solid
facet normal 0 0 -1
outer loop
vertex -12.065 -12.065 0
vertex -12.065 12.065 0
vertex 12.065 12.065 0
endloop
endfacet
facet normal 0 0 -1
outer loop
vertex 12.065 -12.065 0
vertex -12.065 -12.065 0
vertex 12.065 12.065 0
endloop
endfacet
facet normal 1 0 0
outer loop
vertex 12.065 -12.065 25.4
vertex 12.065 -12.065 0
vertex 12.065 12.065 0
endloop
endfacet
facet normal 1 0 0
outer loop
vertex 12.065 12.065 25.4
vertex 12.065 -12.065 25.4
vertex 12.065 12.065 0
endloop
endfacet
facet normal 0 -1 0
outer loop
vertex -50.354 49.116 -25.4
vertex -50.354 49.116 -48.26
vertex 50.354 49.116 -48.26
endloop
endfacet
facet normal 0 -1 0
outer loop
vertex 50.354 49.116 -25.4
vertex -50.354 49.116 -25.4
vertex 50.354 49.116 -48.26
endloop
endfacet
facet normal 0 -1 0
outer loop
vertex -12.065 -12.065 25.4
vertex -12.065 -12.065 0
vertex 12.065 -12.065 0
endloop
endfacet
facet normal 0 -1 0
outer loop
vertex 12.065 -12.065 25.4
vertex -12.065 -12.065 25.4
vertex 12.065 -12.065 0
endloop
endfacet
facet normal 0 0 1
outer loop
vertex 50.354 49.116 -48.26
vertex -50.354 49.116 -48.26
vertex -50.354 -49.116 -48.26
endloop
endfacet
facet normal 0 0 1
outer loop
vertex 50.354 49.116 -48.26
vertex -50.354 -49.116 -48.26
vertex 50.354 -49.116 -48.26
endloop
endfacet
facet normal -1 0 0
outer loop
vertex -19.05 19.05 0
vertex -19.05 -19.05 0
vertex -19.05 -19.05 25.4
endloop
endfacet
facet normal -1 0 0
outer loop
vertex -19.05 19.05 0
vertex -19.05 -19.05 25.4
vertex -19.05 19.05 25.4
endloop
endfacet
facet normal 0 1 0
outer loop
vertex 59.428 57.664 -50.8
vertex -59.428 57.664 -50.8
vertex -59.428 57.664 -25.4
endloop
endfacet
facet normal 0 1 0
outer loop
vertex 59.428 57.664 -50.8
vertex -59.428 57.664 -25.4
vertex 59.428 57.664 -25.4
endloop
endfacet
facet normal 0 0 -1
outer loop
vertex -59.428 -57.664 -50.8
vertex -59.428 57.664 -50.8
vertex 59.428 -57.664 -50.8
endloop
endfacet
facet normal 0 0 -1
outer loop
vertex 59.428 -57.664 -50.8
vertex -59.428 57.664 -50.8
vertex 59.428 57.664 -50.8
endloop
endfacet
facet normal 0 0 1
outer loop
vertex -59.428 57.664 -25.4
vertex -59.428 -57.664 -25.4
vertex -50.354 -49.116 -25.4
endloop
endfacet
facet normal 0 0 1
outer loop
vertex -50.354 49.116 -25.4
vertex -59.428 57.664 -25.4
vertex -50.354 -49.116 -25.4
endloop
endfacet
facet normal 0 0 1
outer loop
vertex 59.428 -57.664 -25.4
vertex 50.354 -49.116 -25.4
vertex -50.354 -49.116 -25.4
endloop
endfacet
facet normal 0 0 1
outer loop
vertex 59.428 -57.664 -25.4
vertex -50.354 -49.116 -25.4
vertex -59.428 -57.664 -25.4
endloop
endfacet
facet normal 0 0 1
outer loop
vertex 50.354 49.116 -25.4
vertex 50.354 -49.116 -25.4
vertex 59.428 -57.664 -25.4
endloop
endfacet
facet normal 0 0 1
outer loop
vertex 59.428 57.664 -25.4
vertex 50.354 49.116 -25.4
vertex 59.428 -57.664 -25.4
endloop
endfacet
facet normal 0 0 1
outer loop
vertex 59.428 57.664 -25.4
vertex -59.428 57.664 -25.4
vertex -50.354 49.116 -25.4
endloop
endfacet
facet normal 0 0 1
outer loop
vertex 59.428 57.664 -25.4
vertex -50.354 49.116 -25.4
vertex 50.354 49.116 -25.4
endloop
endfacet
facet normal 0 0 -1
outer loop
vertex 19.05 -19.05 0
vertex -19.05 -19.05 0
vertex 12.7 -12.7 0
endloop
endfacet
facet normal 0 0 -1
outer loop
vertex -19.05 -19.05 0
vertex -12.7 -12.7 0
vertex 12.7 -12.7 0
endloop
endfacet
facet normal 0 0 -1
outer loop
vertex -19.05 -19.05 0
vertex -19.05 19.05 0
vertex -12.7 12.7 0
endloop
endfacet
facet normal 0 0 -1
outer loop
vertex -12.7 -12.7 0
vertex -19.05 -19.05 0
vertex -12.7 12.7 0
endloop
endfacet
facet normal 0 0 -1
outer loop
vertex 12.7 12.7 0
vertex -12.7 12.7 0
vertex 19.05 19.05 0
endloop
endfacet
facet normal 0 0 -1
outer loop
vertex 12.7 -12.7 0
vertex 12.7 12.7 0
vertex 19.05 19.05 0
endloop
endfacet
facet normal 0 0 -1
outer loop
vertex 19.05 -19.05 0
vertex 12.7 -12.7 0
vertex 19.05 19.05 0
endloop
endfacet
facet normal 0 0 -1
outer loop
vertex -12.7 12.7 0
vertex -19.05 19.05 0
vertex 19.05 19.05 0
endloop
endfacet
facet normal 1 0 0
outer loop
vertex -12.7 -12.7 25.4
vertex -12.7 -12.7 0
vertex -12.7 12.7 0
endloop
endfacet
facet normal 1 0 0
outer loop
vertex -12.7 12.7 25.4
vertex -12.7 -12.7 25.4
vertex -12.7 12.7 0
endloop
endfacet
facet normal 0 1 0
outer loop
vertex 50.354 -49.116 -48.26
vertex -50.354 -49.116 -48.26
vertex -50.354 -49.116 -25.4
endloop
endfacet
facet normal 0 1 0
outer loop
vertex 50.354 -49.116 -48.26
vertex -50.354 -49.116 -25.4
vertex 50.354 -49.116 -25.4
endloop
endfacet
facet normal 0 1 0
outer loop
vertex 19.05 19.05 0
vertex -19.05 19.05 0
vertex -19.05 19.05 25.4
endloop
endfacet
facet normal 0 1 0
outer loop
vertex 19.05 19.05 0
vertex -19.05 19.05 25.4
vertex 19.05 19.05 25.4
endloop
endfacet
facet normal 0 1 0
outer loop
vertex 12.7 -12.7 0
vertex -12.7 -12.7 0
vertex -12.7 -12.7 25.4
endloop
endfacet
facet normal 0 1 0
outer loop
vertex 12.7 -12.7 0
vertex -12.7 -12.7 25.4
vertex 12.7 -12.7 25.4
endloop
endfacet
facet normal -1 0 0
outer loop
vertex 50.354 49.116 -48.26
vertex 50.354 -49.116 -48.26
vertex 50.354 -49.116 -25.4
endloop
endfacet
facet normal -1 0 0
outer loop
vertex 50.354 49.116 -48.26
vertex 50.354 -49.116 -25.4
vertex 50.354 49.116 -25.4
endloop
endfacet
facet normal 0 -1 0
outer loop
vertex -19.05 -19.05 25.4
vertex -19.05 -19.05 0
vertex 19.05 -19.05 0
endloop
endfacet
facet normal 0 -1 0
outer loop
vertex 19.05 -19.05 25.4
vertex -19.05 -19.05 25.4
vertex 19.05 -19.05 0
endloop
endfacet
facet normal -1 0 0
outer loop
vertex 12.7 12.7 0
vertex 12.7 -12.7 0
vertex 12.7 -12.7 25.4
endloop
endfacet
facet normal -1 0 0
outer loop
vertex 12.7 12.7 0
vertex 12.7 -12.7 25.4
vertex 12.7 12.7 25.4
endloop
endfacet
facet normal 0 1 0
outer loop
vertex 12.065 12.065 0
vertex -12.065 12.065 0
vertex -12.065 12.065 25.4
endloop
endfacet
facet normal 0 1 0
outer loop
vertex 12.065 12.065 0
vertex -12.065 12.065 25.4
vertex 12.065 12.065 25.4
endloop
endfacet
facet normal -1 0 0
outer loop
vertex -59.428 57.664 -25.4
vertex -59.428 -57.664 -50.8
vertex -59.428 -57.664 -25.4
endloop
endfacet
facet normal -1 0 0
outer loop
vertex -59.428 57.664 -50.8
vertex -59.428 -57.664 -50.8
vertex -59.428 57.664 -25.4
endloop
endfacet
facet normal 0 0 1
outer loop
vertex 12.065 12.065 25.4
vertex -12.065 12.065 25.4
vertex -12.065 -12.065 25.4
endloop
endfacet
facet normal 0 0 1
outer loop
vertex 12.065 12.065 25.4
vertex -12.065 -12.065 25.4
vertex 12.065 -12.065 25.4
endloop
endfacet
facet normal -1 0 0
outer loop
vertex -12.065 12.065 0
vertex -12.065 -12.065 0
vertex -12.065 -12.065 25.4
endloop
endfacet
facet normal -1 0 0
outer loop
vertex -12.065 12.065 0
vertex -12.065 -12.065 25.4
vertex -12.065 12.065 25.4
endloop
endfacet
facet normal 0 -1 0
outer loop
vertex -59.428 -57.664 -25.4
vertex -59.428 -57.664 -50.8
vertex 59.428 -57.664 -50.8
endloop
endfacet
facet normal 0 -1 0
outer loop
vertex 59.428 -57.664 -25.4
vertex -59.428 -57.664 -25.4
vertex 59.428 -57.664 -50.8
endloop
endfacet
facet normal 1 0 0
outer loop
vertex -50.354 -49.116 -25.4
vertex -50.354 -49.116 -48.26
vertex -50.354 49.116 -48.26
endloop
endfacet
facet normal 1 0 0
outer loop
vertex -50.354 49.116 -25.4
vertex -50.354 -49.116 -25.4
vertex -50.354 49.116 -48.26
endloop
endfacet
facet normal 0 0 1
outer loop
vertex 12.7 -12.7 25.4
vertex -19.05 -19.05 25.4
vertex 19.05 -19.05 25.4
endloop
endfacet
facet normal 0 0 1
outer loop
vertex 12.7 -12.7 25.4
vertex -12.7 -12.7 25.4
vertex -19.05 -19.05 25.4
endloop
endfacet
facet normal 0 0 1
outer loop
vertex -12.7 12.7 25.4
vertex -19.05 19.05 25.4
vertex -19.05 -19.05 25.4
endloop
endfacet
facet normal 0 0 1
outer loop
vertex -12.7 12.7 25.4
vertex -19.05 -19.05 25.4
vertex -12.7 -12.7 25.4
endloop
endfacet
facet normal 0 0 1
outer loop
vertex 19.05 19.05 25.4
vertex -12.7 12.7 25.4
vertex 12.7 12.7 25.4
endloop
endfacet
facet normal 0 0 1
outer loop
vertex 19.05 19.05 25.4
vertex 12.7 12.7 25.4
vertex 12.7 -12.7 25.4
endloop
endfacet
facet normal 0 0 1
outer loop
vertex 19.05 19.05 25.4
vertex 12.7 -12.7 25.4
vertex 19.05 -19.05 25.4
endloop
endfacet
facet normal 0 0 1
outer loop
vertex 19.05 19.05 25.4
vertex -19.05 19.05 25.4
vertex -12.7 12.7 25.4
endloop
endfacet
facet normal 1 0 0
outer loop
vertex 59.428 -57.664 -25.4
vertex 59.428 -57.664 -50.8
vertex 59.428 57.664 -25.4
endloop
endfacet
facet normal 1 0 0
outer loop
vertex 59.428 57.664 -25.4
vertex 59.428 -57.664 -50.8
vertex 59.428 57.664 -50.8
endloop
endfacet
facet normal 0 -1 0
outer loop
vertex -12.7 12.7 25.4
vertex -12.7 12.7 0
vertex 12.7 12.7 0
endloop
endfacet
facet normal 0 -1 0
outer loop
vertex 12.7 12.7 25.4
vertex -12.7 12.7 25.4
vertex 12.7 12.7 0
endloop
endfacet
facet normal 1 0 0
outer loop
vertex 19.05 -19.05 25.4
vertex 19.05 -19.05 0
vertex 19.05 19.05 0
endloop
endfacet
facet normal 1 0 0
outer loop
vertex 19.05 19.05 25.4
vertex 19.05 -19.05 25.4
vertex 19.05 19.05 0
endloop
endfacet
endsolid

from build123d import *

# Parameters (mm, degrees)
F0_W     = 24.13
F0_H     = 24.13
F1_DEPTH = 25.4
F2_W     = 38.1
F2_H     = 38.1
F2_W_2   = 25.4
F2_H_2   = 25.4
F3_DEPTH = 25.4
F5_W     = 118.855782
F5_H     = 115.327134
F5_W_2   = 100.707702
F5_H_2   = 98.231218
F6_DEPTH = 25.4
F7_DEPTH = 2.54


with BuildPart() as f1:
    # F0 (on Top) → F1 (new body)
    with BuildSketch(Plane.XY):
        Rectangle(F0_W, F0_H)
    extrude(amount=F1_DEPTH)


with BuildPart() as f3:
    # F2 (on Top) → F3 (new body)
    with BuildSketch(Plane.XY):
        Rectangle(F2_W, F2_H)
        Rectangle(F2_W_2, F2_H_2, mode=Mode.SUBTRACT)
    extrude(amount=F3_DEPTH)


with BuildPart() as f6:
    # F5 (on offset) → F6 (new body)
    with BuildSketch(Plane.XY.offset(-50.8)):
        Rectangle(F5_W, F5_H)
        Rectangle(F5_W_2, F5_H_2, mode=Mode.SUBTRACT)
    extrude(amount=F6_DEPTH)

    # F5 (on offset) → F7 (join)
    with BuildSketch(Plane.XY.offset(-50.8)):
        Rectangle(F5_W_2, F5_H_2)
    extrude(amount=F7_DEPTH)


solid = Compound([f1.part, f3.part, f6.part])
